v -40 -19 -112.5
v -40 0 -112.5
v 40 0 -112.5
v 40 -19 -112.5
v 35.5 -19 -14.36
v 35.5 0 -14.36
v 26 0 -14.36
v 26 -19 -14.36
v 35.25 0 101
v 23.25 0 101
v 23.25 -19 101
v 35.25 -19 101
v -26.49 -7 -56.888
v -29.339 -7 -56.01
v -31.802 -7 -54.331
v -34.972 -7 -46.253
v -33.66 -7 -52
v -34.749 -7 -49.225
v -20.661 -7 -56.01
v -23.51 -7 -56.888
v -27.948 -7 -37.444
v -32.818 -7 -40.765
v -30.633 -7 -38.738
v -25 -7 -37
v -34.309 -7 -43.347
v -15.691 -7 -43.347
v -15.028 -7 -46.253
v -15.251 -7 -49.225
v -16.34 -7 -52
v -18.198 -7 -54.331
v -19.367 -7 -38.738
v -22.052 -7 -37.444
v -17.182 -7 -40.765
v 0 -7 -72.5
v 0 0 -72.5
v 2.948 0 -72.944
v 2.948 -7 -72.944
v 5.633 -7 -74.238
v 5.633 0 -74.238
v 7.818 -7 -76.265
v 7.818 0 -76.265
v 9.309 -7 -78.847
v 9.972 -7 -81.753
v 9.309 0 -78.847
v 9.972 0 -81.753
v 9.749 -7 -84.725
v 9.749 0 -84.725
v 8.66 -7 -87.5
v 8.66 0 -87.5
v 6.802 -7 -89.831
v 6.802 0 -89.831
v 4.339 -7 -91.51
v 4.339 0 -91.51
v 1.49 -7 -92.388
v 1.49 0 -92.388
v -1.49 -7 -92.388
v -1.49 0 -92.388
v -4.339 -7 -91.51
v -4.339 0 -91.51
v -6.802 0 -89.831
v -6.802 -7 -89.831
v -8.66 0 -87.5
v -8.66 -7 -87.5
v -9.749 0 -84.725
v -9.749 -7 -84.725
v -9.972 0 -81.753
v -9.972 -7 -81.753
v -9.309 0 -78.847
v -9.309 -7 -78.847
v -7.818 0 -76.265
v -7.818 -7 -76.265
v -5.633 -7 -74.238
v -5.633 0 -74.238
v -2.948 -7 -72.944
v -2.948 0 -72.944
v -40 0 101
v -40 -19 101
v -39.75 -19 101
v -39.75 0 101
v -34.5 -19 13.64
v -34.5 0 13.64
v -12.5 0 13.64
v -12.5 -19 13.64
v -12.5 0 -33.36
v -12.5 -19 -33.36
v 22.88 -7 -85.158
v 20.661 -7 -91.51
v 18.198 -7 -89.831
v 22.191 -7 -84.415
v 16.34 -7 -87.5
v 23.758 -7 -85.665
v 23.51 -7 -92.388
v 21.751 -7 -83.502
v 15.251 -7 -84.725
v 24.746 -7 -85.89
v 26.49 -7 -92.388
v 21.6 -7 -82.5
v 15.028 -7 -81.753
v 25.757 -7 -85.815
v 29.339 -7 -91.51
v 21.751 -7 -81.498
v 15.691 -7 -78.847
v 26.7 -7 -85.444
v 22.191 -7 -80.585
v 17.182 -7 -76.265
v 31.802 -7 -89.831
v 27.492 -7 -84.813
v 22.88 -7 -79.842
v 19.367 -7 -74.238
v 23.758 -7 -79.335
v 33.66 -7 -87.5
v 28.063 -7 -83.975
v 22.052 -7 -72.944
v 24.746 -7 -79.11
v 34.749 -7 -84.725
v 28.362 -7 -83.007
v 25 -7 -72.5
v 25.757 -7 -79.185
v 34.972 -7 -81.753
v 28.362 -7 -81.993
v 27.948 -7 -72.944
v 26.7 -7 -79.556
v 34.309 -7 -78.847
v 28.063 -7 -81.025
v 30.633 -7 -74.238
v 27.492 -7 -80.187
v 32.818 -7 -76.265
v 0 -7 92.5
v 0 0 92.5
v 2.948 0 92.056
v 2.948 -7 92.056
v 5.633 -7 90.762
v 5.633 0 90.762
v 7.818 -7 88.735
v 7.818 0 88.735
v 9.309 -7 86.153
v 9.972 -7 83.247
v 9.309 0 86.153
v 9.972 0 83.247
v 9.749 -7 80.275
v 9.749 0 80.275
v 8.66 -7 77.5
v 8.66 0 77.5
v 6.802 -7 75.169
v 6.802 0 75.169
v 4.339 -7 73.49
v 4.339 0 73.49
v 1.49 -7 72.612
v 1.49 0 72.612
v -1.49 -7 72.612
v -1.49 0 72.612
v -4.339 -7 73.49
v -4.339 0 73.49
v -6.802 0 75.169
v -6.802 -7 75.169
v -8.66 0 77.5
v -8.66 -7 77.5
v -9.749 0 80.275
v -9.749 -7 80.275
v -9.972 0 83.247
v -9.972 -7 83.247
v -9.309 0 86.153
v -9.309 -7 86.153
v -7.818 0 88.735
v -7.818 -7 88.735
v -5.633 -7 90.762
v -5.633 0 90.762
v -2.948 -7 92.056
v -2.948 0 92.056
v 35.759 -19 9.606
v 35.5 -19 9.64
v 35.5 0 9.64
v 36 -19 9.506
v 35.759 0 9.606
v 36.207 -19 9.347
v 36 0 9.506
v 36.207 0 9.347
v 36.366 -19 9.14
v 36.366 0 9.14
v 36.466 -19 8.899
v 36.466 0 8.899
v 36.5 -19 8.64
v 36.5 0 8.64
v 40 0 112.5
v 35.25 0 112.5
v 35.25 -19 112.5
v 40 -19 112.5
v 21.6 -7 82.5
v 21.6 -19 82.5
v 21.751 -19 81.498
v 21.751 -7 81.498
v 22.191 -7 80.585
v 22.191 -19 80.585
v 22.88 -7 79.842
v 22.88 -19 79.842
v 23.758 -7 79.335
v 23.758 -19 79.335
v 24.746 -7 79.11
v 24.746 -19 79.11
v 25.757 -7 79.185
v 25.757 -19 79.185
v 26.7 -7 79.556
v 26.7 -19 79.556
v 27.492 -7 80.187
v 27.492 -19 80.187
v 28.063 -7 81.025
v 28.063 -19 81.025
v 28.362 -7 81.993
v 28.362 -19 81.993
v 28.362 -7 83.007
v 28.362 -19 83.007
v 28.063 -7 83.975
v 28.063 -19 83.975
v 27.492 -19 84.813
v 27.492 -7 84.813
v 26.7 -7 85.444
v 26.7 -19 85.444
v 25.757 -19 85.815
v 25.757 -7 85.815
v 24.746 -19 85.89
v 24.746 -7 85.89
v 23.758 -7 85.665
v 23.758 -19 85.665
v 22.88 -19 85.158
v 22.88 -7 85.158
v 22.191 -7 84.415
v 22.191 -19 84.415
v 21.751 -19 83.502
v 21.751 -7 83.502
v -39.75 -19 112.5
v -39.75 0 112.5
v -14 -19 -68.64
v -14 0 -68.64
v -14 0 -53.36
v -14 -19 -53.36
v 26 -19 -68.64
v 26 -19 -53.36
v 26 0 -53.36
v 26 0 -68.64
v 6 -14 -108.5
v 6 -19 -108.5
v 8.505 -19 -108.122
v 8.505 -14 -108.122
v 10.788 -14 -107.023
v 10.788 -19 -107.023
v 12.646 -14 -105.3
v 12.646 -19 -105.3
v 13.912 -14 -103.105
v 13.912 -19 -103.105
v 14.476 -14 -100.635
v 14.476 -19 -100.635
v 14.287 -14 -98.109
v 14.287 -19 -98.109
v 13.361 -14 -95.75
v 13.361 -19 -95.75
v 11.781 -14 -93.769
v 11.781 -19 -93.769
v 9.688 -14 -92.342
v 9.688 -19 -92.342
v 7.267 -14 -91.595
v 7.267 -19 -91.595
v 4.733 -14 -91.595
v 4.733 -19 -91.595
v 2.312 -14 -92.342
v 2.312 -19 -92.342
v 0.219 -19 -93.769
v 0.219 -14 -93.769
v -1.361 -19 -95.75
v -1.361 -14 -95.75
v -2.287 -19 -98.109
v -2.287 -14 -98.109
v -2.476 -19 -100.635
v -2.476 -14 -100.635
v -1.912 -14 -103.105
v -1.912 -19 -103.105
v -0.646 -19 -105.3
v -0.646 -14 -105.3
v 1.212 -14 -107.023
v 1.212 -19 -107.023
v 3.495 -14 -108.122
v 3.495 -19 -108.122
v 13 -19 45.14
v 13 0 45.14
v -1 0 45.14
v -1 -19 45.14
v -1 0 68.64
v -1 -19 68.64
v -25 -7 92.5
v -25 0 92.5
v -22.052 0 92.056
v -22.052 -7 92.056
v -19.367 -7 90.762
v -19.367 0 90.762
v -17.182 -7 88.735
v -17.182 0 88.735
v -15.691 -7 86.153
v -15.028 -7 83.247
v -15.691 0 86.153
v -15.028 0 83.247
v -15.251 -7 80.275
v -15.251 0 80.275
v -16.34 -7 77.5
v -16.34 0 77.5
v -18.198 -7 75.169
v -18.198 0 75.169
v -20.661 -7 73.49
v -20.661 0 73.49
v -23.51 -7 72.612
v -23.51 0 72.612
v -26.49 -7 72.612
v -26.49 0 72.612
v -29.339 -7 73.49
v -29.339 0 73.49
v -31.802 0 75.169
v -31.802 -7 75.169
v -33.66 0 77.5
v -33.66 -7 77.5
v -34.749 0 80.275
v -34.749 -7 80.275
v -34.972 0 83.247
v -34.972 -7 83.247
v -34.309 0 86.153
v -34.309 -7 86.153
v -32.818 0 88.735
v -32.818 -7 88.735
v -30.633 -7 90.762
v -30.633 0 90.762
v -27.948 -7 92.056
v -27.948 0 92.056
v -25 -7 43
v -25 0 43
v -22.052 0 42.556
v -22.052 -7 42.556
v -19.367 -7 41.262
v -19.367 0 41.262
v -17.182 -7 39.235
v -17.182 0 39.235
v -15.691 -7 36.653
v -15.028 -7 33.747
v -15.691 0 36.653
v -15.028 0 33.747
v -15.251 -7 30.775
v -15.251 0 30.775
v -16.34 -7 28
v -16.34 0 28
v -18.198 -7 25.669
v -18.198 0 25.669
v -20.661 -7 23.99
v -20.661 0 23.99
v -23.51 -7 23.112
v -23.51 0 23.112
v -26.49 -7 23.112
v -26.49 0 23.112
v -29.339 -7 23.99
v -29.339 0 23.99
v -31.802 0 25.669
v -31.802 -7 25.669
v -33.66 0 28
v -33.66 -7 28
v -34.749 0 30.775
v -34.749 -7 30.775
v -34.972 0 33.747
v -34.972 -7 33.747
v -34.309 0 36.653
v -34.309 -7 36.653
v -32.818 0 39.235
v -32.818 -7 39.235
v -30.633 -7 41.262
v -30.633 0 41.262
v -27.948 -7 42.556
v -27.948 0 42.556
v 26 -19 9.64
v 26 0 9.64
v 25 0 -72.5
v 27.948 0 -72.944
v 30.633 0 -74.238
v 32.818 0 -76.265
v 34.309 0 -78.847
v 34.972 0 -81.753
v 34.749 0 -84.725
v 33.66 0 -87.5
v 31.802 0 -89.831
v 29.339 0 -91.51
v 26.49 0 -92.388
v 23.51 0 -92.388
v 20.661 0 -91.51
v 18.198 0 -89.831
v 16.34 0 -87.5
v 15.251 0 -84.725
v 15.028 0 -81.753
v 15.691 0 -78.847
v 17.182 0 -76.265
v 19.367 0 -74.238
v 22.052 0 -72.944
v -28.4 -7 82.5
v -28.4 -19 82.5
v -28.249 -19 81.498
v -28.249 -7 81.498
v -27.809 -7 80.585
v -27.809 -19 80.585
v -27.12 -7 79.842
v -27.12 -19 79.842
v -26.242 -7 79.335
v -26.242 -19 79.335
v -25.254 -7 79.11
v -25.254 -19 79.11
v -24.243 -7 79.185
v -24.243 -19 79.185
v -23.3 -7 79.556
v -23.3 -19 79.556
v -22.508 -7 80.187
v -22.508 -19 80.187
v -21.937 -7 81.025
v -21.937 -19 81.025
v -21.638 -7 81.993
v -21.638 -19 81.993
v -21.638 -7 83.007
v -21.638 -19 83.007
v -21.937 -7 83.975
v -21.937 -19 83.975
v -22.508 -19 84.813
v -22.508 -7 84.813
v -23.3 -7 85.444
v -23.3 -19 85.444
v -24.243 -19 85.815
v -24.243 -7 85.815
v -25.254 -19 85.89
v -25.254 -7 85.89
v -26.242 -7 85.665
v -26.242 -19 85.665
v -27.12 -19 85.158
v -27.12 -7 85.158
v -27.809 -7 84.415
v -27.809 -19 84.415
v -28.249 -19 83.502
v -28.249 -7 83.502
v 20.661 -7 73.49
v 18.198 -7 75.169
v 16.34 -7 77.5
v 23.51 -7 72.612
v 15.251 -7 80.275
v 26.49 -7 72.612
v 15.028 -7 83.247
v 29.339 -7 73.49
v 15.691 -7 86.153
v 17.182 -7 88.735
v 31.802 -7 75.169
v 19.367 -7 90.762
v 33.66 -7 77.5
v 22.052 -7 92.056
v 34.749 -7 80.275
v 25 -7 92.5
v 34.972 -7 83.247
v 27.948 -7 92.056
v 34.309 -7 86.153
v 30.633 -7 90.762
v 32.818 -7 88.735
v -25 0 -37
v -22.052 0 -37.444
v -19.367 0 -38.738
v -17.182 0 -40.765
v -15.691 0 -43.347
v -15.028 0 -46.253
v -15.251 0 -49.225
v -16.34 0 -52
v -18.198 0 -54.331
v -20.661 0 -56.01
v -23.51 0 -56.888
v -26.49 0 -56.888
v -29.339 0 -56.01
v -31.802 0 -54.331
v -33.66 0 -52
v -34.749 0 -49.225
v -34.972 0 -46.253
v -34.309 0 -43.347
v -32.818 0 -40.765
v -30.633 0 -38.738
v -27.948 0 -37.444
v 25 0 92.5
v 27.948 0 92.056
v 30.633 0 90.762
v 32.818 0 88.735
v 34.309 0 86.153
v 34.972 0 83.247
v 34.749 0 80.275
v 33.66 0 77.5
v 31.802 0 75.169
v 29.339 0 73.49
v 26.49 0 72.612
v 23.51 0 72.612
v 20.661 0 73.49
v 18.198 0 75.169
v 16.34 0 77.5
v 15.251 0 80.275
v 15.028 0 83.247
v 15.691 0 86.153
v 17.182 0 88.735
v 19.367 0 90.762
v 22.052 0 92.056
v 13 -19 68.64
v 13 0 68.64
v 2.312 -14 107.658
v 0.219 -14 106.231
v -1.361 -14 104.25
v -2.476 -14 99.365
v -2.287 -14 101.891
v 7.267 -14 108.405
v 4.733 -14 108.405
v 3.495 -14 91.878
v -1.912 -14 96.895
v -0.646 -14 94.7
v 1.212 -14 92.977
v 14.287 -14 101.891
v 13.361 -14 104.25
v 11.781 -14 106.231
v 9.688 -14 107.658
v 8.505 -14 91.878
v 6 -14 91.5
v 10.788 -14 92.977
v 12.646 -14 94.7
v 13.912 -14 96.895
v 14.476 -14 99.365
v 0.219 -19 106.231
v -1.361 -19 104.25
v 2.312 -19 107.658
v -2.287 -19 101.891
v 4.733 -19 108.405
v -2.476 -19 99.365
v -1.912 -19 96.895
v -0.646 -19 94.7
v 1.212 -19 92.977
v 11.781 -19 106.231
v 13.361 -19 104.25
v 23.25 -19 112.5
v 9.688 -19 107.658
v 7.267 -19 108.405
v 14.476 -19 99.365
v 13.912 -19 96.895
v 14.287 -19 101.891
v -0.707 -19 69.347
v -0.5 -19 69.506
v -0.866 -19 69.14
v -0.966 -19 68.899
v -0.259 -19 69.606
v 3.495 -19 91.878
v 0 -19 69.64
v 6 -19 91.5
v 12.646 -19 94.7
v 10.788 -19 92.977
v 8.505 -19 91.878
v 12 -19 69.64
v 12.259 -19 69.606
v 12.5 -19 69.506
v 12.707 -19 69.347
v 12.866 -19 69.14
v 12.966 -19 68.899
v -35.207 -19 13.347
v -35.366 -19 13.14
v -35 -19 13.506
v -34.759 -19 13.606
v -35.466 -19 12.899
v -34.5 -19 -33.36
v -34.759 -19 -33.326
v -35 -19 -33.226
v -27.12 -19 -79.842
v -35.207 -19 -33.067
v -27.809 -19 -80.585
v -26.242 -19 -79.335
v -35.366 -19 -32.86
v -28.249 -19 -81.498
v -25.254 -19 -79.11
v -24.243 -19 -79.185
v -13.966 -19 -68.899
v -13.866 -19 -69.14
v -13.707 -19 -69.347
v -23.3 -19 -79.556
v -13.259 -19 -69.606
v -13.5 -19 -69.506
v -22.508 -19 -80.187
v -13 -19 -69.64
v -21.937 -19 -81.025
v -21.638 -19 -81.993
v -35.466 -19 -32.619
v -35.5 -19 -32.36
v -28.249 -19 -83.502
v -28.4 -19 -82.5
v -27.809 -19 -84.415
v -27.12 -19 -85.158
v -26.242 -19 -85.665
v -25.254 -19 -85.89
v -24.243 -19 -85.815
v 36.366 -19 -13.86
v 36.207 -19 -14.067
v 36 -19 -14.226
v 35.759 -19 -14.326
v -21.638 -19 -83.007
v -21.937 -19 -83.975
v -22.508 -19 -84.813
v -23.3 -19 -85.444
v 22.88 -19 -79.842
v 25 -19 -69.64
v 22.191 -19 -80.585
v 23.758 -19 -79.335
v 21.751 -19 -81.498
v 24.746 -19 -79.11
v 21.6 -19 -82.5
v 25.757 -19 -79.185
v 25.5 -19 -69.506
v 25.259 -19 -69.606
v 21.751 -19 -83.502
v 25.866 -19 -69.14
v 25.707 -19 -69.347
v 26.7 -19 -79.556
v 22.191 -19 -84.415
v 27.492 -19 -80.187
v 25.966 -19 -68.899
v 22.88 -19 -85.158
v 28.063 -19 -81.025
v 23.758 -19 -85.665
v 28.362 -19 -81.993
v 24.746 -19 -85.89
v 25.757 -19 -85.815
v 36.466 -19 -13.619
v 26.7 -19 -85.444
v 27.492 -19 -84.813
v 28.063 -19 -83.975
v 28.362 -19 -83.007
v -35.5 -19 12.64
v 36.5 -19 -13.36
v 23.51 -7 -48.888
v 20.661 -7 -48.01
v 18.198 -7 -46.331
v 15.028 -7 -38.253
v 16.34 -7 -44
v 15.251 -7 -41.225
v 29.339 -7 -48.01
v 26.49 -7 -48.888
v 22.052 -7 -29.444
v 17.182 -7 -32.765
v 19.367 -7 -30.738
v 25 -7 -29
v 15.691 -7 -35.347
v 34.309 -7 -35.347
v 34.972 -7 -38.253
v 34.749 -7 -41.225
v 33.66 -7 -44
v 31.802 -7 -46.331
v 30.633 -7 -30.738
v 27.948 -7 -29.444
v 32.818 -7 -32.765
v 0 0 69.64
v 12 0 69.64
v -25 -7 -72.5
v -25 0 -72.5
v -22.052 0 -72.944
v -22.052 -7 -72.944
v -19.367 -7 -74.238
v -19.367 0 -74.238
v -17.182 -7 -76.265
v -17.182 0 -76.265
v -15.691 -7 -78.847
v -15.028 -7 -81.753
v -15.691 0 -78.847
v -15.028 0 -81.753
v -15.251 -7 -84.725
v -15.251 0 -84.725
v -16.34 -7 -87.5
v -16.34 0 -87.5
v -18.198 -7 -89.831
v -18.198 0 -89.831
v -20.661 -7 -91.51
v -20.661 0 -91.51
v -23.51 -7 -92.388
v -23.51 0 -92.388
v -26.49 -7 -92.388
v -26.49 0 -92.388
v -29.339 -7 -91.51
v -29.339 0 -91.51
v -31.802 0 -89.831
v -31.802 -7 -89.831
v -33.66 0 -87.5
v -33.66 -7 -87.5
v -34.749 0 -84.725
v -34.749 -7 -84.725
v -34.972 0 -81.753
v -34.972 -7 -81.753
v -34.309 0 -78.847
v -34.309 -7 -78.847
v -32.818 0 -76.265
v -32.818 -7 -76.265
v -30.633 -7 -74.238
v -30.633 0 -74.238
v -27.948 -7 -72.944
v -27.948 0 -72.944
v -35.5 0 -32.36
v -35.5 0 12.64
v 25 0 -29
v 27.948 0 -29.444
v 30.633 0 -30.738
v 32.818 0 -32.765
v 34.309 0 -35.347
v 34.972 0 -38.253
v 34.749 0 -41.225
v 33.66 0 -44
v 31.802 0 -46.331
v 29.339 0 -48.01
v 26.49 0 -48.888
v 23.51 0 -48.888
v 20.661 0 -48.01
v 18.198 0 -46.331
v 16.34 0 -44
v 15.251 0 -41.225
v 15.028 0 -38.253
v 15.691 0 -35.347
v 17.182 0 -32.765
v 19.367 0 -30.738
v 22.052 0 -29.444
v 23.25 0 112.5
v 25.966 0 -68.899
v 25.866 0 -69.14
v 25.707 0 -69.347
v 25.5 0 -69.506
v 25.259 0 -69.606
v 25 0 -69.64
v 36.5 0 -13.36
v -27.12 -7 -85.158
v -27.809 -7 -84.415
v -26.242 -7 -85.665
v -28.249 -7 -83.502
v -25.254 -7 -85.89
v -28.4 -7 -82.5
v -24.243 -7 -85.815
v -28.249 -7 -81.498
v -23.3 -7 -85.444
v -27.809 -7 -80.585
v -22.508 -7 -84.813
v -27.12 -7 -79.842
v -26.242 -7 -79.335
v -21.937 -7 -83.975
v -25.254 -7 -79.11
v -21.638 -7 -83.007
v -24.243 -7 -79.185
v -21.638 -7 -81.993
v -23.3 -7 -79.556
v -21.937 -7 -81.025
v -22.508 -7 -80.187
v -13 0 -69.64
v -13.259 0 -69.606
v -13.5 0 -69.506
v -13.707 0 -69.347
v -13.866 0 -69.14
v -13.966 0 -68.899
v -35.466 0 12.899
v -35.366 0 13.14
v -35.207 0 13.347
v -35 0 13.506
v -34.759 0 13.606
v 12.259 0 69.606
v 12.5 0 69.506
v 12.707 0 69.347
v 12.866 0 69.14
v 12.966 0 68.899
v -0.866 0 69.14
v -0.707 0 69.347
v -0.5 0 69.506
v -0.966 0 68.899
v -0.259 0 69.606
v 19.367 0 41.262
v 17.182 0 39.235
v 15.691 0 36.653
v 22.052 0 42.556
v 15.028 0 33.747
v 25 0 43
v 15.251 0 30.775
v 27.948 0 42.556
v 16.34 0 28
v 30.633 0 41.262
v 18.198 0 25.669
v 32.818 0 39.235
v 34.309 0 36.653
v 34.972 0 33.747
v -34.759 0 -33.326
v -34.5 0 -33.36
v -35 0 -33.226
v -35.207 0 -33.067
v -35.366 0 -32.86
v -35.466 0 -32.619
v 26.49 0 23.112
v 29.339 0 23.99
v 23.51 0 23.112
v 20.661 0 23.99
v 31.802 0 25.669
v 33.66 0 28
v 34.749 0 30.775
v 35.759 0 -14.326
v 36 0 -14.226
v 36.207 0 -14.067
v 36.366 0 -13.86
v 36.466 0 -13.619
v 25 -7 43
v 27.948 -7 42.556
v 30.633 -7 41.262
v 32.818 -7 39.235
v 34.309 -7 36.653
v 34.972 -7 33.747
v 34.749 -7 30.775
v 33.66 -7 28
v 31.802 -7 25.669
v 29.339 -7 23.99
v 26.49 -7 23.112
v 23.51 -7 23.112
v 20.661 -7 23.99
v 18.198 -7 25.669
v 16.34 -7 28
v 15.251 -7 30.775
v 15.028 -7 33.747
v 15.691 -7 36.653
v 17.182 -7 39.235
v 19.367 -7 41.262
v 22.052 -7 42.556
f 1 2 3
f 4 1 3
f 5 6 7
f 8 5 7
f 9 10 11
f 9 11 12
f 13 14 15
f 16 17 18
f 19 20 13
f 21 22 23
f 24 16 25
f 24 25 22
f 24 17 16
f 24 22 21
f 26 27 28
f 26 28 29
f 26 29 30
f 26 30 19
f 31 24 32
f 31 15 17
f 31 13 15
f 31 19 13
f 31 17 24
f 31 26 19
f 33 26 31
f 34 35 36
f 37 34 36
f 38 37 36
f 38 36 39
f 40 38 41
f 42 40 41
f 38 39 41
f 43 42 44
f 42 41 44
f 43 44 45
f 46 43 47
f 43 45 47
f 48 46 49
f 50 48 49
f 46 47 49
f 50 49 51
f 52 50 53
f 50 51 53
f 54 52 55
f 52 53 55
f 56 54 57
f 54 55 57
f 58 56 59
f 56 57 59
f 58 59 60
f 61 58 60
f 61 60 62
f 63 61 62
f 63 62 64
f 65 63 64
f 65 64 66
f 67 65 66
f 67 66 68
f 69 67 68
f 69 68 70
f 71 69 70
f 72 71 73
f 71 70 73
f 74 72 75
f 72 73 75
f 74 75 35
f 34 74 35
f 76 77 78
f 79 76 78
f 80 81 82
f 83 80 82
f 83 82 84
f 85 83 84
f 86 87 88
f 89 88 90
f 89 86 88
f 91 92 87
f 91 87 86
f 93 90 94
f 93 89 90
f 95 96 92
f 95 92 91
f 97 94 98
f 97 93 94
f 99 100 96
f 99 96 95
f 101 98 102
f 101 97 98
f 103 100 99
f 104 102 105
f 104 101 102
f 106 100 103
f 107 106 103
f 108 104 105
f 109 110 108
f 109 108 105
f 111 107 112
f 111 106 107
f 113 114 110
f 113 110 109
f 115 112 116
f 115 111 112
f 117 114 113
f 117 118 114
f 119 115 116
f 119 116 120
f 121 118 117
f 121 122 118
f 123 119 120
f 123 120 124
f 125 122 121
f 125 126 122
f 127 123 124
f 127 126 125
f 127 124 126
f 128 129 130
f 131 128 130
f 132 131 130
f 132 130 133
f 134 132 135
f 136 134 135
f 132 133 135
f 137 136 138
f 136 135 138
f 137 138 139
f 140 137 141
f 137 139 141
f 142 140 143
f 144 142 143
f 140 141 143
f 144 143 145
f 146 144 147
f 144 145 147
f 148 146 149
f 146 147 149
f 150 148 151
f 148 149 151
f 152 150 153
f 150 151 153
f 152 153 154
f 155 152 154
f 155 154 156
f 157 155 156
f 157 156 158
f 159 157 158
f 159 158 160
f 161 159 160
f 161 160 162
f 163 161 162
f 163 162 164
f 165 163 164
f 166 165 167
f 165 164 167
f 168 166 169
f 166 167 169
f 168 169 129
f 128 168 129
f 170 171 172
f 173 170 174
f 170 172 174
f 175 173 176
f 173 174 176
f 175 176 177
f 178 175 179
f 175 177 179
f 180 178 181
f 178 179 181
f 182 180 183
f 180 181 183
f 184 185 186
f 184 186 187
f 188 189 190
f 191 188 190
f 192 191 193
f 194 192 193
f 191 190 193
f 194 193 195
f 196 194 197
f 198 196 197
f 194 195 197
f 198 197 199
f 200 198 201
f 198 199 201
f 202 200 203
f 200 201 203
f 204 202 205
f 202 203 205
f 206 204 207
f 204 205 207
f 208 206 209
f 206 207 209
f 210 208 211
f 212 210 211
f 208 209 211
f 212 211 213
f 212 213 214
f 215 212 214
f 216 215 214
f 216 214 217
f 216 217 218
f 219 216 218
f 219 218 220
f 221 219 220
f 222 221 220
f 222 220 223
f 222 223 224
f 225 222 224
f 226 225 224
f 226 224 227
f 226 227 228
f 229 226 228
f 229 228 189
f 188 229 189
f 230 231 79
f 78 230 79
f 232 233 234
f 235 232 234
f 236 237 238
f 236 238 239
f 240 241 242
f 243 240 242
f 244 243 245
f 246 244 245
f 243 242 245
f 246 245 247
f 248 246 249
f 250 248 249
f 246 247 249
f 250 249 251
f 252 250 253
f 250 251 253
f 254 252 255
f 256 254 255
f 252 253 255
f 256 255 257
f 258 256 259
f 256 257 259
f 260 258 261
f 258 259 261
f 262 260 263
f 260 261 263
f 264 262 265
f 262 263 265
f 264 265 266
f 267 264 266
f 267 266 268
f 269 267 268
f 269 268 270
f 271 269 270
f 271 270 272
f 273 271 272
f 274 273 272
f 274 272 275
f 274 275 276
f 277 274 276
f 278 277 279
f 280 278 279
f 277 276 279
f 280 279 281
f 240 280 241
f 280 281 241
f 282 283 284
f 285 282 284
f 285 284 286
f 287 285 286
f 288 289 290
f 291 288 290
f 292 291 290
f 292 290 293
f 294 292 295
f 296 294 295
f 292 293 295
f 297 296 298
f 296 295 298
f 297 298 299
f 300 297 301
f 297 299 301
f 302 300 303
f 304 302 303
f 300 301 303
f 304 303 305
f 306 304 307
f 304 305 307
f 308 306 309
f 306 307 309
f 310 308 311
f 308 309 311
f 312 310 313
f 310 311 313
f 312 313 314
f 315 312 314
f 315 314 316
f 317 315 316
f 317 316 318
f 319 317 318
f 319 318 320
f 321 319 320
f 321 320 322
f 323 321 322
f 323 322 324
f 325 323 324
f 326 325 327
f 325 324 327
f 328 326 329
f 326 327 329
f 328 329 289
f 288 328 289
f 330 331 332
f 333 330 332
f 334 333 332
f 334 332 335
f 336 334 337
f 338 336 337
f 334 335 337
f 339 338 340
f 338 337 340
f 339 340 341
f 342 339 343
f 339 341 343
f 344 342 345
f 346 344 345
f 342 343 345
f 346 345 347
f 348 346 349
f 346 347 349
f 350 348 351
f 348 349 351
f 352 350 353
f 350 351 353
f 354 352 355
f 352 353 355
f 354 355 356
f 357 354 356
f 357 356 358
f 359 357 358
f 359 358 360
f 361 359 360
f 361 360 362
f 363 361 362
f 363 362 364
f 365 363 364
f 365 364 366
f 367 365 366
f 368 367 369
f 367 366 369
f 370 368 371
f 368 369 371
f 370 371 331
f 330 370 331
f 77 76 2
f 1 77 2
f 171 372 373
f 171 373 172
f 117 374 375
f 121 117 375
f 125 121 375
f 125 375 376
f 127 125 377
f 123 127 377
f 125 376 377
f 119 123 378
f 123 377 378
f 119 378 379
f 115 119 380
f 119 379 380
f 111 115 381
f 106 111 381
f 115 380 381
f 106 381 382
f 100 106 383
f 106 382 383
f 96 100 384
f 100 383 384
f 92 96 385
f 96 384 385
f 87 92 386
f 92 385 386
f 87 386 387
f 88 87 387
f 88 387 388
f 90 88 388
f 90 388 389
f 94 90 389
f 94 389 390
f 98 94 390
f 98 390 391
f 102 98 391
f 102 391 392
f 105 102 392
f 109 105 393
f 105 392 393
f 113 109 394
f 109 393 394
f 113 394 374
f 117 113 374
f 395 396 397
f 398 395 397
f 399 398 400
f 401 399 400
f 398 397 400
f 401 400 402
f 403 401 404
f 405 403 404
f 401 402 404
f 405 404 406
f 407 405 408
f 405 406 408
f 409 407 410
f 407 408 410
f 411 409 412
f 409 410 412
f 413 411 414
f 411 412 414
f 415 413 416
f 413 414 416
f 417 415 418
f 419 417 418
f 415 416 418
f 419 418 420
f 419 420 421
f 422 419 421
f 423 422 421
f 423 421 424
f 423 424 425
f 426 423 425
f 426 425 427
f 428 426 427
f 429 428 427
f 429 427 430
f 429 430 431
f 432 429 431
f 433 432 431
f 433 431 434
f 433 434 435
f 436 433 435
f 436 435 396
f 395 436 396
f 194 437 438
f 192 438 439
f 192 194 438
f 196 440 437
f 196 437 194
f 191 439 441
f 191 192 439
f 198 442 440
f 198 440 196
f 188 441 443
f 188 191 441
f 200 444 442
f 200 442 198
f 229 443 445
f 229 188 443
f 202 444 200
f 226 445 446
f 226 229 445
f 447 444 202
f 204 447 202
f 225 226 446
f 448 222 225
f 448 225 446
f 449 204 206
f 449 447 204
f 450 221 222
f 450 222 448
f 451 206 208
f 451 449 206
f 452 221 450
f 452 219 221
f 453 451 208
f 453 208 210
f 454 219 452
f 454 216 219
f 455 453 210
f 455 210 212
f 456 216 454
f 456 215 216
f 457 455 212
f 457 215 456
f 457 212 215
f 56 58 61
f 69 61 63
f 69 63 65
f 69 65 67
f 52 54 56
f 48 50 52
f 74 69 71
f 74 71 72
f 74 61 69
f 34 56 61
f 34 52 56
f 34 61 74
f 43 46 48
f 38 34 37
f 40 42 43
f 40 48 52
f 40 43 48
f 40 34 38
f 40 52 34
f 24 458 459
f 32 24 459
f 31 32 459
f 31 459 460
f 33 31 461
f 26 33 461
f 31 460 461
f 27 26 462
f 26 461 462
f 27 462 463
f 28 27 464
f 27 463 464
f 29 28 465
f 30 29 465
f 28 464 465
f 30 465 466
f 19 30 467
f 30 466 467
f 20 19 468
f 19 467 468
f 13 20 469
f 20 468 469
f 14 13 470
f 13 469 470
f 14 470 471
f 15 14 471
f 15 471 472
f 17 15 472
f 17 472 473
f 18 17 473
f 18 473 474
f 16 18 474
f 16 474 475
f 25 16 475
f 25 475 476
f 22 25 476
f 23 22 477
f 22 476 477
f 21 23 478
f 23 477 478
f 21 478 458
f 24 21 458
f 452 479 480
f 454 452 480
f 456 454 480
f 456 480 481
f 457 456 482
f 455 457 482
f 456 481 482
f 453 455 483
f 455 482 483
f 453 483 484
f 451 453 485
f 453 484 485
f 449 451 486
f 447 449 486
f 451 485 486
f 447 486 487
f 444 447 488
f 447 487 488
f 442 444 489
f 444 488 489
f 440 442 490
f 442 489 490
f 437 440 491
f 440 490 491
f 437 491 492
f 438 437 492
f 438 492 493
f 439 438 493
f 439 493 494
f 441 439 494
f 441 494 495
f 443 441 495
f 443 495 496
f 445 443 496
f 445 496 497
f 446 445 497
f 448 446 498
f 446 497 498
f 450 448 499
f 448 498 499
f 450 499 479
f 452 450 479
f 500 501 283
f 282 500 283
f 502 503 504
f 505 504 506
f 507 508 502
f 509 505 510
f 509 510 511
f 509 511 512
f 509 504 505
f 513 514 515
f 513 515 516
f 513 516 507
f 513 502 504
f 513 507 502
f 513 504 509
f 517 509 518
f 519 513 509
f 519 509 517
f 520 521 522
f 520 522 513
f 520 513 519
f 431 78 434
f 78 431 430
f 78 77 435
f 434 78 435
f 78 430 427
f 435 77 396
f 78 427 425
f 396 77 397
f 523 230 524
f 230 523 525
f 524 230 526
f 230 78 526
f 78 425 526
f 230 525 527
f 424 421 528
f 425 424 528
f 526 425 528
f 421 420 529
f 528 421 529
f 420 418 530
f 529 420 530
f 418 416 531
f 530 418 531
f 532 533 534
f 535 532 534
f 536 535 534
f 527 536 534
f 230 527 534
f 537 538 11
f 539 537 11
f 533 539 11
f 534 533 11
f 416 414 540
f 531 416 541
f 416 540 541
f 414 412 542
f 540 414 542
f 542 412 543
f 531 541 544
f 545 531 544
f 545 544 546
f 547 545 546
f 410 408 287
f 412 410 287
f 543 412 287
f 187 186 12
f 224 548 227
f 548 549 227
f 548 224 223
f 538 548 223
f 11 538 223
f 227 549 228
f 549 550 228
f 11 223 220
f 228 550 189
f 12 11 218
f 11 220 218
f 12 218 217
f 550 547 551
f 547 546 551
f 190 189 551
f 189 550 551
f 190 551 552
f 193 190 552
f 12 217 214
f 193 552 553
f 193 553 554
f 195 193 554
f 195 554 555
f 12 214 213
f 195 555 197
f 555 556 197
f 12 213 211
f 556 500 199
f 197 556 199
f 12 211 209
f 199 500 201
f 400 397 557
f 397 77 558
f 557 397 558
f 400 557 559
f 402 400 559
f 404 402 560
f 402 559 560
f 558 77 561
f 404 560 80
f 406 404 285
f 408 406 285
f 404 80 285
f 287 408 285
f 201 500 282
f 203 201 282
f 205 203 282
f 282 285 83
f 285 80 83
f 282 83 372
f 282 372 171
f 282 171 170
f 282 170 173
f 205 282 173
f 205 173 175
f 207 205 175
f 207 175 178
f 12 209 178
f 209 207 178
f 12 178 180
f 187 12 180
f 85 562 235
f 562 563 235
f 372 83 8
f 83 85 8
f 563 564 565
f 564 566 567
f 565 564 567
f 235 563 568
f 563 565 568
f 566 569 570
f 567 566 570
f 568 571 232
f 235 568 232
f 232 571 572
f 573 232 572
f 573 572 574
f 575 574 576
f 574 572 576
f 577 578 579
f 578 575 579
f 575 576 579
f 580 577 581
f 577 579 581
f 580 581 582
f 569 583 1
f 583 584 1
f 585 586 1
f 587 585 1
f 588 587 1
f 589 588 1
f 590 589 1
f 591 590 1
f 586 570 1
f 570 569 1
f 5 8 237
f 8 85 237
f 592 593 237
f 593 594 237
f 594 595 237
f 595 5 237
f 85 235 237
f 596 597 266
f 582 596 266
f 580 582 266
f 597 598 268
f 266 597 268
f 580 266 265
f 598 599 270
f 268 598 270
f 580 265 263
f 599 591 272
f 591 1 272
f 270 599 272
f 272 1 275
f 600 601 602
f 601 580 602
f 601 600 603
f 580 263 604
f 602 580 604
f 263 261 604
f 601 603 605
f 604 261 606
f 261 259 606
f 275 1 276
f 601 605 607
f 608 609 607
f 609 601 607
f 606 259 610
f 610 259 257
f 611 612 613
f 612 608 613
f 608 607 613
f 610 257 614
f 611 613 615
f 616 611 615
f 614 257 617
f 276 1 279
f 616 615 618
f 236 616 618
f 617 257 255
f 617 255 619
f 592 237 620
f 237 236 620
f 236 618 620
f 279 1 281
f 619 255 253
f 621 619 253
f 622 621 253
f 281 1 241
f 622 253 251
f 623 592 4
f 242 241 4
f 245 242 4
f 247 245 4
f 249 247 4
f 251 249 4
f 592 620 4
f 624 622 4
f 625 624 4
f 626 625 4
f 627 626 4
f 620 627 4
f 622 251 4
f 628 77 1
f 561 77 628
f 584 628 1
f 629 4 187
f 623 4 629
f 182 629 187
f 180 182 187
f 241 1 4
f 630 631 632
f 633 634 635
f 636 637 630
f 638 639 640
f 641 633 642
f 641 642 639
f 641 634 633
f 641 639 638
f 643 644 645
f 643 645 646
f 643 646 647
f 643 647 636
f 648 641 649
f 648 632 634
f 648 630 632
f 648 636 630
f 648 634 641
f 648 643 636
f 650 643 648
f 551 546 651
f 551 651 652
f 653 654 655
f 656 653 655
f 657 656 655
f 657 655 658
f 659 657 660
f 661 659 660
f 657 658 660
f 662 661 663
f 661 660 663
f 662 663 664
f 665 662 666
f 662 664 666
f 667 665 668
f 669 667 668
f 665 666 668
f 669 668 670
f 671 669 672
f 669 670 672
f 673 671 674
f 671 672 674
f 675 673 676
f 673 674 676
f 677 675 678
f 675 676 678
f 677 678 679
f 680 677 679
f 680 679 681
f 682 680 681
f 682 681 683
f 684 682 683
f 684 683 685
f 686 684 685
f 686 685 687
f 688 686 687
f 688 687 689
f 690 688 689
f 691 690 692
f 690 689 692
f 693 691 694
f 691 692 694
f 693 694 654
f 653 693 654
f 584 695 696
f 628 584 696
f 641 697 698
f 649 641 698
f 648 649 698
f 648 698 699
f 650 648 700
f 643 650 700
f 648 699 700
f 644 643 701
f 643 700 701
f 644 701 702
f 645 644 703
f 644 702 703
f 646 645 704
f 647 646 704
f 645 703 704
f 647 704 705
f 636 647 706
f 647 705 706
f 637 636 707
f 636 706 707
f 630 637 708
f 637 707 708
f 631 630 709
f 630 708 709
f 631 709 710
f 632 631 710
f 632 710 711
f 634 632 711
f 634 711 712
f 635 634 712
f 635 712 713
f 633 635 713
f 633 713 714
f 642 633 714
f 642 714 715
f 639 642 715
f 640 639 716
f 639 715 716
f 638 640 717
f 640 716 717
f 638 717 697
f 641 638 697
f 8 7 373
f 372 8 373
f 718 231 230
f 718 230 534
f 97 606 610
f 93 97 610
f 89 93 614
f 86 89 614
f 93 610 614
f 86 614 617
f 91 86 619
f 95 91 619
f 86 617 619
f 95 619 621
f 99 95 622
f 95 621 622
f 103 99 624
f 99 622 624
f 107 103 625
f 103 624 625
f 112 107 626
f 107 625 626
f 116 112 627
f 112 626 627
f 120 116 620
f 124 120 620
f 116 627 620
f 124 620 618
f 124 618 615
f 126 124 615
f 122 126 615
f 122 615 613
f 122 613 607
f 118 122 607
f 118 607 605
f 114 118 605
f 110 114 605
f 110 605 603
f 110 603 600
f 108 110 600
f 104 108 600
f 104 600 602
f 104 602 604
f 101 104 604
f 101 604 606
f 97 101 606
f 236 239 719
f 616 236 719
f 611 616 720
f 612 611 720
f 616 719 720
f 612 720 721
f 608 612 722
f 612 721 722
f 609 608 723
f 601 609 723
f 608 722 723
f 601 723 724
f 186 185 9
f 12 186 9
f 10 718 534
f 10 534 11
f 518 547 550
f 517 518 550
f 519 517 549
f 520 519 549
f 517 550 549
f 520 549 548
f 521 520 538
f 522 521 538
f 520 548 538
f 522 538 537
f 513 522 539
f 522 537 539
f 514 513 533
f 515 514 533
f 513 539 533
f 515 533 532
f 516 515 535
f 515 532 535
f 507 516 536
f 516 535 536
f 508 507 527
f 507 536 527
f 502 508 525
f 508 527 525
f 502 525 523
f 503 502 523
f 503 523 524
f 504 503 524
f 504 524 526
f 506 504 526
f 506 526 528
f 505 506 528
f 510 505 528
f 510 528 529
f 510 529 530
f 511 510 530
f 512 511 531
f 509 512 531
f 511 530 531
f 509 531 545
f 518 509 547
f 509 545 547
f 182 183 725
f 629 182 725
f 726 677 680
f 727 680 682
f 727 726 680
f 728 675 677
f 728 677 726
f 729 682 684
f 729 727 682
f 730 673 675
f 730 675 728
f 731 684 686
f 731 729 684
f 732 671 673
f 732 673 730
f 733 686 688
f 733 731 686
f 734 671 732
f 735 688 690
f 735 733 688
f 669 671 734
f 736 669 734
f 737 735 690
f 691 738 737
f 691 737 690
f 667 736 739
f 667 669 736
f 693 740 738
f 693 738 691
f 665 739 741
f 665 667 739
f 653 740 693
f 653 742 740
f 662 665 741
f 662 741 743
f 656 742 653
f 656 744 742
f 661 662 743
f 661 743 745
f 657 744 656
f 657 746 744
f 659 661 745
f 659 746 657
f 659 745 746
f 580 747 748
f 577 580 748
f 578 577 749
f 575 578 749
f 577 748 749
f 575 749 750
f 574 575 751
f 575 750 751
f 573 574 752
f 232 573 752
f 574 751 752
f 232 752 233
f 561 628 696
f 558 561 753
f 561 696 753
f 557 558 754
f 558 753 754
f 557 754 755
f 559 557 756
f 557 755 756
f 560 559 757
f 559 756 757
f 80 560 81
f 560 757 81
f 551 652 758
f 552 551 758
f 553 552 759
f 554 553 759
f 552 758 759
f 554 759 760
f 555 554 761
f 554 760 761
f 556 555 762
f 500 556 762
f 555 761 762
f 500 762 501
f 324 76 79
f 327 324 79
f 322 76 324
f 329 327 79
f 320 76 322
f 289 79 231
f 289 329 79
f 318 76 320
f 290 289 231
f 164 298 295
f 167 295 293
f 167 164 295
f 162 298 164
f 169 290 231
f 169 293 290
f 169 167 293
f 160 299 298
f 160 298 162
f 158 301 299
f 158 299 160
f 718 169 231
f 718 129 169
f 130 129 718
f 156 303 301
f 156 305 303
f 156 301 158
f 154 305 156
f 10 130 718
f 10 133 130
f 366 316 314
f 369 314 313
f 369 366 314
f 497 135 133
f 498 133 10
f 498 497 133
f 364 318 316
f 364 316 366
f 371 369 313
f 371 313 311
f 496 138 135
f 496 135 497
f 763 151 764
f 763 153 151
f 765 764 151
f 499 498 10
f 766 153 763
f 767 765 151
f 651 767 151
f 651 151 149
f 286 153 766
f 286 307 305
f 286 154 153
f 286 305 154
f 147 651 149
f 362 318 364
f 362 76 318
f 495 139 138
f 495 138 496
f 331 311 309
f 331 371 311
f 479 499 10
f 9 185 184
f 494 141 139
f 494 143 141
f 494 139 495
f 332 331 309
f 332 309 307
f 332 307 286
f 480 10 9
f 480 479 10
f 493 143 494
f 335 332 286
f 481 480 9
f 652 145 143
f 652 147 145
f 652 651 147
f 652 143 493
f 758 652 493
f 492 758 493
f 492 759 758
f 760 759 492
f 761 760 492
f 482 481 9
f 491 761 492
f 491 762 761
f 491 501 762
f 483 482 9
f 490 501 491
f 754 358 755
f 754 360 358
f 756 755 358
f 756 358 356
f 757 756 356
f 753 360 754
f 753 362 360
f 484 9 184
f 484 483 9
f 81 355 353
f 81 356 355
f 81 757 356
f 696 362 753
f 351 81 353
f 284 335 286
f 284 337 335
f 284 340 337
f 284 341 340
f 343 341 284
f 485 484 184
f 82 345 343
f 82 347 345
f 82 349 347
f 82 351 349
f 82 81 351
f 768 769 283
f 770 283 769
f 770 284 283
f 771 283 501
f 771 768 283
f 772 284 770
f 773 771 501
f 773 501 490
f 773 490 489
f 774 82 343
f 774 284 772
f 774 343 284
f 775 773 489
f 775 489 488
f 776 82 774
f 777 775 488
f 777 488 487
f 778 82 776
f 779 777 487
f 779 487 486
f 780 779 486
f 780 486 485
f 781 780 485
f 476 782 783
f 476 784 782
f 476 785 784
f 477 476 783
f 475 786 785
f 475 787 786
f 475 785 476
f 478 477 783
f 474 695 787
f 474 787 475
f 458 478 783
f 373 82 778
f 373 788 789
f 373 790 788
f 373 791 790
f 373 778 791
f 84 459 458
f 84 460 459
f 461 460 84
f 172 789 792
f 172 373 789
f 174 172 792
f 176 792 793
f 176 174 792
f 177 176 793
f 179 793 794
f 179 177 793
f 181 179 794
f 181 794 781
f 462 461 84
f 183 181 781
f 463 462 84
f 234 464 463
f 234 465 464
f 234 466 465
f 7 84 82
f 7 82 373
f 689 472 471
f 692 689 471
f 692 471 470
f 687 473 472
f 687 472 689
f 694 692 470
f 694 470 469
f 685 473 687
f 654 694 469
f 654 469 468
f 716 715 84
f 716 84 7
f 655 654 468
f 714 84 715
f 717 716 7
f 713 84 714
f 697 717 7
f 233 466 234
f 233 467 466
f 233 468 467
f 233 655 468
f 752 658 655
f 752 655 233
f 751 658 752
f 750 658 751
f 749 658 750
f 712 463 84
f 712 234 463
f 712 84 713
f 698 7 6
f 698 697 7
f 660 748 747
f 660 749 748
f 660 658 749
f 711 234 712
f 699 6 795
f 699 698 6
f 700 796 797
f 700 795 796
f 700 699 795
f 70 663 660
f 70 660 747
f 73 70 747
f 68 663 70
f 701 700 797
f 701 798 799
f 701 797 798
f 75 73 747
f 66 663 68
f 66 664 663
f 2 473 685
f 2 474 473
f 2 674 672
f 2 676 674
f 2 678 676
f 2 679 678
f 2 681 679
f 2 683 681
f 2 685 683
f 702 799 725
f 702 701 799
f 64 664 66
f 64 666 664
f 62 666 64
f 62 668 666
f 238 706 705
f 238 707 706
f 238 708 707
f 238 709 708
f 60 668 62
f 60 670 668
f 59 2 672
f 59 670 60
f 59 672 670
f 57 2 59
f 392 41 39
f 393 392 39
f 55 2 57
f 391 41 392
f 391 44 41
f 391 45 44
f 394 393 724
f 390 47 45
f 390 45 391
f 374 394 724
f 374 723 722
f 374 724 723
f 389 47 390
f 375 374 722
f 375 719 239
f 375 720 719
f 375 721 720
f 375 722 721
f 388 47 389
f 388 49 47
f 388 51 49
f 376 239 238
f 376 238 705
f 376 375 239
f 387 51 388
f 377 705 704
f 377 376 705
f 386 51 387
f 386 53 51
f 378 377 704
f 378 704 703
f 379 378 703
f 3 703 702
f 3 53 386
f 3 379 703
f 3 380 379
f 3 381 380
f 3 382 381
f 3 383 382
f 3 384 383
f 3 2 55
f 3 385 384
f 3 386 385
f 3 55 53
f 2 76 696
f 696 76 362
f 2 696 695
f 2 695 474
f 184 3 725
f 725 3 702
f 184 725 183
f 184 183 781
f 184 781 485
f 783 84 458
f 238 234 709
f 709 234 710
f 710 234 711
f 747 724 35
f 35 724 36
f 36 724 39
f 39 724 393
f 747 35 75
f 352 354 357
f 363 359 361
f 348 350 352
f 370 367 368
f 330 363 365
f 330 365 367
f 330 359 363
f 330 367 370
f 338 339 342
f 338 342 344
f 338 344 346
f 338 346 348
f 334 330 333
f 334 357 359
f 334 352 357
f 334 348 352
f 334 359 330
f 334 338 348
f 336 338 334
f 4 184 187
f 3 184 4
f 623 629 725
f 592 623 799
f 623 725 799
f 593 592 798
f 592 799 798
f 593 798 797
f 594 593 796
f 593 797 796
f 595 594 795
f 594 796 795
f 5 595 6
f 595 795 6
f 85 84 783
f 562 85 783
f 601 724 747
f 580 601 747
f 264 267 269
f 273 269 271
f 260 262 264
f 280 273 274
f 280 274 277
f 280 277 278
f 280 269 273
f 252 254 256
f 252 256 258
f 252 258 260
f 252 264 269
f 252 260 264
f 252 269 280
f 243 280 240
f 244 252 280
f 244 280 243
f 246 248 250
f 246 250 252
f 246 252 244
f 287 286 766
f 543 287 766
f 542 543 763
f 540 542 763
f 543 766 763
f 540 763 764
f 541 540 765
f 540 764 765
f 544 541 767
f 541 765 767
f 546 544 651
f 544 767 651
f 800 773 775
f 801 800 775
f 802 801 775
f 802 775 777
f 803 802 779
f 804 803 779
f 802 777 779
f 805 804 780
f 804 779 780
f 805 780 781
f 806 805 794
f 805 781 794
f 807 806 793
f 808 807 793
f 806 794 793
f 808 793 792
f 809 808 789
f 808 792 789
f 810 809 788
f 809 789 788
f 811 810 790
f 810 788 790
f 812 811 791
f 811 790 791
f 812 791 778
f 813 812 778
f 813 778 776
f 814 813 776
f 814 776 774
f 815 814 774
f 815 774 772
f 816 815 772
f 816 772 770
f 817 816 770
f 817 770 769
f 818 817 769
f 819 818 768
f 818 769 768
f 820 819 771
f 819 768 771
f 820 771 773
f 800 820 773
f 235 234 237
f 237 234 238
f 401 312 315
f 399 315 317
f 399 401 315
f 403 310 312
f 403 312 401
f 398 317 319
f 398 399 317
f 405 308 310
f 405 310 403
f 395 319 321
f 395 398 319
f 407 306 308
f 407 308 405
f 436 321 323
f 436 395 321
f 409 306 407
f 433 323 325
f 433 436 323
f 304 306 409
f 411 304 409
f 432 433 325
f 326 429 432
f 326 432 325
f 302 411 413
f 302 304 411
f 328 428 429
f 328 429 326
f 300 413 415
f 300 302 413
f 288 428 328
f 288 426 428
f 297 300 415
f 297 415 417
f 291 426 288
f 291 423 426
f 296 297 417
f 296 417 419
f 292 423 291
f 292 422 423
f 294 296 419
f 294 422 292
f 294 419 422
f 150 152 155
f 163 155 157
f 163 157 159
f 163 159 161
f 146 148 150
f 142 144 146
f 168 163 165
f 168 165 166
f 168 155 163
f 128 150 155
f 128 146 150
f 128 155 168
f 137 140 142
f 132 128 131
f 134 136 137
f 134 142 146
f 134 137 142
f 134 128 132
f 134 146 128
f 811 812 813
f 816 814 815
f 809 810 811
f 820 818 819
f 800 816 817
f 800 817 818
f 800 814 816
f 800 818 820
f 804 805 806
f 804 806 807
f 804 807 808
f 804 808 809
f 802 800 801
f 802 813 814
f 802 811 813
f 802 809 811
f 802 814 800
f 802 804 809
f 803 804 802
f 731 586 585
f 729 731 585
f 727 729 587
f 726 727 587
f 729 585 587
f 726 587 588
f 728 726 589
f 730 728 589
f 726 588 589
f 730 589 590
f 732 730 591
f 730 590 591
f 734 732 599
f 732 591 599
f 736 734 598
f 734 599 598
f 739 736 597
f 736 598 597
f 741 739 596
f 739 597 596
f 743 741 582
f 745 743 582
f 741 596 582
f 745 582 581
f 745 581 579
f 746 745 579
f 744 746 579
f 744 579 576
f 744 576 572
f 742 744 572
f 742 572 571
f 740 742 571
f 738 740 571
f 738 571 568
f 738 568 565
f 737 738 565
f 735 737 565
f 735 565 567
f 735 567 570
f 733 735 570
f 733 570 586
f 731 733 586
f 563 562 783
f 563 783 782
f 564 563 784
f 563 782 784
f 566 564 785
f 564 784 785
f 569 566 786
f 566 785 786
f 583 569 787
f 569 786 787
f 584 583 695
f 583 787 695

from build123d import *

# Parameters (mm, degrees)
SKETCH1_W           = 80
SKETCH1_H           = 225
BOSS_EXTRUDE1_DEPTH = 19
CUT_EXTRUDE1_REACH  = 122.902
SKETCH4_R           = 10
CUT_EXTRUDE2_DEPTH  = 7
SKETCH5_R           = 8.5
CUT_EXTRUDE3_DEPTH  = 5
CUT_EXTRUDE4_REACH  = 122.902
SKETCH7_W           = 12
SKETCH7_H           = 11.5
SKETCH7_W_2         = 1
M8_TAPPED_HOLE1_D   = 6.8


with BuildPart() as part:
    # Sketch1 → Boss-Extrude1 (new body)
    with BuildSketch(Plane(origin=(0, 0, 0), x_dir=(1, 0, 0), z_dir=(0, 1, 0))):
        Rectangle(SKETCH1_W, SKETCH1_H)
    extrude(amount=-BOSS_EXTRUDE1_DEPTH)

    # Sketch2 → Cut-Extrude1 (cut, up to next)
    with BuildSketch(Plane(origin=(0, 0, 0), x_dir=(1, 0, 0), z_dir=(0, 1, 0)), mode=Mode.PRIVATE) as cut_extrude1_sk1:
        with BuildLine():
            Line((-34.5, -13.64), (-12.5, -13.64))
            Line((-12.5, -13.64), (-12.5, 33.36))
            Line((-12.5, 33.36), (-34.5, 33.36))
            ThreePointArc((-34.5, 33.36), (-35.207106781, 33.067106781), (-35.5, 32.36))
            Line((-35.5, 32.36), (-35.5, -12.64))
            ThreePointArc((-35.5, -12.64), (-35.207106781, -13.347106781), (-34.5, -13.64))
        make_face()
    cut_extrude1_tool1 = extrude(cut_extrude1_sk1.sketch, amount=-CUT_EXTRUDE1_REACH, mode=Mode.PRIVATE) & part.part
    # Sketch2 → Cut-Extrude1 (cut, up to next)
    with BuildSketch(Plane(origin=(0, 0, 0), x_dir=(1, 0, 0), z_dir=(0, 1, 0)), mode=Mode.PRIVATE) as cut_extrude1_sk2:
        with BuildLine():
            Line((0, -69.64), (12, -69.64))
            ThreePointArc((12, -69.64), (12.707106781, -69.347106781), (13, -68.64))
            Line((13, -68.64), (13, -45.14))
            Line((13, -45.14), (-1, -45.14))
            Line((-1, -45.14), (-1, -68.64))
            ThreePointArc((-1, -68.64), (-0.707106781, -69.347106781), (0, -69.64))
        make_face()
    cut_extrude1_tool2 = extrude(cut_extrude1_sk2.sketch, amount=-CUT_EXTRUDE1_REACH, mode=Mode.PRIVATE) & part.part
    # Sketch2 → Cut-Extrude1 (cut, up to next)
    with BuildSketch(Plane(origin=(0, 0, 0), x_dir=(1, 0, 0), z_dir=(0, 1, 0)), mode=Mode.PRIVATE) as cut_extrude1_sk3:
        with BuildLine():
            Line((35.5, 14.36), (26, 14.36))
            Line((26, 14.36), (26, -9.64))
            Line((26, -9.64), (35.5, -9.64))
            ThreePointArc((35.5, -9.64), (36.207106781, -9.347106781), (36.5, -8.64))
            Line((36.5, -8.64), (36.5, 13.36))
            ThreePointArc((36.5, 13.36), (36.207106781, 14.067106781), (35.5, 14.36))
        make_face()
    cut_extrude1_tool3 = extrude(cut_extrude1_sk3.sketch, amount=-CUT_EXTRUDE1_REACH, mode=Mode.PRIVATE) & part.part
    # Sketch2 → Cut-Extrude1 (cut, up to next)
    with BuildSketch(Plane(origin=(0, 0, 0), x_dir=(1, 0, 0), z_dir=(0, 1, 0)), mode=Mode.PRIVATE) as cut_extrude1_sk4:
        with BuildLine():
            Line((26, 53.36), (26, 68.64))
            ThreePointArc((26, 68.64), (25.707106781, 69.347106781), (25, 69.64))
            Line((25, 69.64), (-13, 69.64))
            ThreePointArc((-13, 69.64), (-13.707106781, 69.347106781), (-14, 68.64))
            Line((-14, 68.64), (-14, 53.36))
            Line((-14, 53.36), (26, 53.36))
        make_face()
    cut_extrude1_tool4 = extrude(cut_extrude1_sk4.sketch, amount=-CUT_EXTRUDE1_REACH, mode=Mode.PRIVATE) & part.part
    add(cut_extrude1_tool1.solids().sort_by_distance((-23.995521, 0, -9.86))[0], mode=Mode.SUBTRACT)
    add(cut_extrude1_tool2.solids().sort_by_distance((6, 0, 57.374932))[0], mode=Mode.SUBTRACT)
    add(cut_extrude1_tool3.solids().sort_by_distance((31.241424, 0, -2.36))[0], mode=Mode.SUBTRACT)
    add(cut_extrude1_tool4.solids().sort_by_distance((6, 0, -61.494779))[0], mode=Mode.SUBTRACT)

    # Sketch4 → Cut-Extrude2 (cut)
    with BuildSketch(Plane(origin=(0, 0, 0), x_dir=(1, 0, 0), z_dir=(0, 1, 0))):
        with Locations(Location((25, -82.5, 0), (0, 0, 270))):
            Circle(SKETCH4_R)
        with Locations(Location((0, -82.5, 0), (0, 0, 270))):
            Circle(SKETCH4_R)
        with Locations(Location((-25, -82.5, 0), (0, 0, 270))):
            Circle(SKETCH4_R)
        with Locations(Location((-25, -33, 0), (0, 0, 270))):
            Circle(SKETCH4_R)
        with Locations(Location((25, -33, 0), (0, 0, 270))):
            Circle(SKETCH4_R)
        with Locations(Location((25, 39, 0), (0, 0, 270))):
            Circle(SKETCH4_R)
        with Locations(Location((-25, 47, 0), (0, 0, 270))):
            Circle(SKETCH4_R)
        with Locations(Location((-25, 82.5, 0), (0, 0, 270))):
            Circle(SKETCH4_R)
        with Locations(Location((0, 82.5, 0), (0, 0, 270))):
            Circle(SKETCH4_R)
        with Locations(Location((25, 82.5, 0), (0, 0, 270))):
            Circle(SKETCH4_R)
    extrude(amount=-CUT_EXTRUDE2_DEPTH, mode=Mode.SUBTRACT)

    # Sketch5 → Cut-Extrude3 (cut)
    with BuildSketch(Plane.XZ.offset(19)):
        with Locations(Location((6, 100, 0), (0, 0, 270))):
            Circle(SKETCH5_R)
        with Locations(Location((6, -100, 0), (0, 0, 270))):
            Circle(SKETCH5_R)
    extrude(amount=-CUT_EXTRUDE3_DEPTH, mode=Mode.SUBTRACT)

    # Sketch7 → Cut-Extrude4 (cut, up to next)
    with BuildSketch(Plane(origin=(0, 0, 0), x_dir=(1, 0, 0), z_dir=(0, 1, 0)), mode=Mode.PRIVATE) as cut_extrude4_sk1:
        with Locations((29.25, -106.75)):
            Rectangle(SKETCH7_W, SKETCH7_H)
    cut_extrude4_tool1 = extrude(cut_extrude4_sk1.sketch, amount=-CUT_EXTRUDE4_REACH, mode=Mode.PRIVATE) & part.part
    # Sketch7 → Cut-Extrude4 (cut, up to next)
    with BuildSketch(Plane(origin=(0, 0, 0), x_dir=(1, 0, 0), z_dir=(0, 1, 0)), mode=Mode.PRIVATE) as cut_extrude4_sk2:
        with Locations((-40.25, -106.75)):
            Rectangle(SKETCH7_W_2, SKETCH7_H)
    cut_extrude4_tool2 = extrude(cut_extrude4_sk2.sketch, amount=-CUT_EXTRUDE4_REACH, mode=Mode.PRIVATE) & part.part
    add(cut_extrude4_tool1.solids().sort_by_distance((29.25, 0, 106.75))[0], mode=Mode.SUBTRACT)
    add(cut_extrude4_tool2.solids().sort_by_distance((-40.25, 0, 106.75))[0], mode=Mode.SUBTRACT)

    # M8 Tapped Hole1 (through all)
    with Locations(Plane(origin=(0, 0, 0), x_dir=(1, 0, 0), z_dir=(0, 1, 0))):
        with Locations((-25, 82.5), (25, 82.5), (25, -82.5), (-25, -82.5)):
            Hole(M8_TAPPED_HOLE1_D / 2)


solid = part.part
